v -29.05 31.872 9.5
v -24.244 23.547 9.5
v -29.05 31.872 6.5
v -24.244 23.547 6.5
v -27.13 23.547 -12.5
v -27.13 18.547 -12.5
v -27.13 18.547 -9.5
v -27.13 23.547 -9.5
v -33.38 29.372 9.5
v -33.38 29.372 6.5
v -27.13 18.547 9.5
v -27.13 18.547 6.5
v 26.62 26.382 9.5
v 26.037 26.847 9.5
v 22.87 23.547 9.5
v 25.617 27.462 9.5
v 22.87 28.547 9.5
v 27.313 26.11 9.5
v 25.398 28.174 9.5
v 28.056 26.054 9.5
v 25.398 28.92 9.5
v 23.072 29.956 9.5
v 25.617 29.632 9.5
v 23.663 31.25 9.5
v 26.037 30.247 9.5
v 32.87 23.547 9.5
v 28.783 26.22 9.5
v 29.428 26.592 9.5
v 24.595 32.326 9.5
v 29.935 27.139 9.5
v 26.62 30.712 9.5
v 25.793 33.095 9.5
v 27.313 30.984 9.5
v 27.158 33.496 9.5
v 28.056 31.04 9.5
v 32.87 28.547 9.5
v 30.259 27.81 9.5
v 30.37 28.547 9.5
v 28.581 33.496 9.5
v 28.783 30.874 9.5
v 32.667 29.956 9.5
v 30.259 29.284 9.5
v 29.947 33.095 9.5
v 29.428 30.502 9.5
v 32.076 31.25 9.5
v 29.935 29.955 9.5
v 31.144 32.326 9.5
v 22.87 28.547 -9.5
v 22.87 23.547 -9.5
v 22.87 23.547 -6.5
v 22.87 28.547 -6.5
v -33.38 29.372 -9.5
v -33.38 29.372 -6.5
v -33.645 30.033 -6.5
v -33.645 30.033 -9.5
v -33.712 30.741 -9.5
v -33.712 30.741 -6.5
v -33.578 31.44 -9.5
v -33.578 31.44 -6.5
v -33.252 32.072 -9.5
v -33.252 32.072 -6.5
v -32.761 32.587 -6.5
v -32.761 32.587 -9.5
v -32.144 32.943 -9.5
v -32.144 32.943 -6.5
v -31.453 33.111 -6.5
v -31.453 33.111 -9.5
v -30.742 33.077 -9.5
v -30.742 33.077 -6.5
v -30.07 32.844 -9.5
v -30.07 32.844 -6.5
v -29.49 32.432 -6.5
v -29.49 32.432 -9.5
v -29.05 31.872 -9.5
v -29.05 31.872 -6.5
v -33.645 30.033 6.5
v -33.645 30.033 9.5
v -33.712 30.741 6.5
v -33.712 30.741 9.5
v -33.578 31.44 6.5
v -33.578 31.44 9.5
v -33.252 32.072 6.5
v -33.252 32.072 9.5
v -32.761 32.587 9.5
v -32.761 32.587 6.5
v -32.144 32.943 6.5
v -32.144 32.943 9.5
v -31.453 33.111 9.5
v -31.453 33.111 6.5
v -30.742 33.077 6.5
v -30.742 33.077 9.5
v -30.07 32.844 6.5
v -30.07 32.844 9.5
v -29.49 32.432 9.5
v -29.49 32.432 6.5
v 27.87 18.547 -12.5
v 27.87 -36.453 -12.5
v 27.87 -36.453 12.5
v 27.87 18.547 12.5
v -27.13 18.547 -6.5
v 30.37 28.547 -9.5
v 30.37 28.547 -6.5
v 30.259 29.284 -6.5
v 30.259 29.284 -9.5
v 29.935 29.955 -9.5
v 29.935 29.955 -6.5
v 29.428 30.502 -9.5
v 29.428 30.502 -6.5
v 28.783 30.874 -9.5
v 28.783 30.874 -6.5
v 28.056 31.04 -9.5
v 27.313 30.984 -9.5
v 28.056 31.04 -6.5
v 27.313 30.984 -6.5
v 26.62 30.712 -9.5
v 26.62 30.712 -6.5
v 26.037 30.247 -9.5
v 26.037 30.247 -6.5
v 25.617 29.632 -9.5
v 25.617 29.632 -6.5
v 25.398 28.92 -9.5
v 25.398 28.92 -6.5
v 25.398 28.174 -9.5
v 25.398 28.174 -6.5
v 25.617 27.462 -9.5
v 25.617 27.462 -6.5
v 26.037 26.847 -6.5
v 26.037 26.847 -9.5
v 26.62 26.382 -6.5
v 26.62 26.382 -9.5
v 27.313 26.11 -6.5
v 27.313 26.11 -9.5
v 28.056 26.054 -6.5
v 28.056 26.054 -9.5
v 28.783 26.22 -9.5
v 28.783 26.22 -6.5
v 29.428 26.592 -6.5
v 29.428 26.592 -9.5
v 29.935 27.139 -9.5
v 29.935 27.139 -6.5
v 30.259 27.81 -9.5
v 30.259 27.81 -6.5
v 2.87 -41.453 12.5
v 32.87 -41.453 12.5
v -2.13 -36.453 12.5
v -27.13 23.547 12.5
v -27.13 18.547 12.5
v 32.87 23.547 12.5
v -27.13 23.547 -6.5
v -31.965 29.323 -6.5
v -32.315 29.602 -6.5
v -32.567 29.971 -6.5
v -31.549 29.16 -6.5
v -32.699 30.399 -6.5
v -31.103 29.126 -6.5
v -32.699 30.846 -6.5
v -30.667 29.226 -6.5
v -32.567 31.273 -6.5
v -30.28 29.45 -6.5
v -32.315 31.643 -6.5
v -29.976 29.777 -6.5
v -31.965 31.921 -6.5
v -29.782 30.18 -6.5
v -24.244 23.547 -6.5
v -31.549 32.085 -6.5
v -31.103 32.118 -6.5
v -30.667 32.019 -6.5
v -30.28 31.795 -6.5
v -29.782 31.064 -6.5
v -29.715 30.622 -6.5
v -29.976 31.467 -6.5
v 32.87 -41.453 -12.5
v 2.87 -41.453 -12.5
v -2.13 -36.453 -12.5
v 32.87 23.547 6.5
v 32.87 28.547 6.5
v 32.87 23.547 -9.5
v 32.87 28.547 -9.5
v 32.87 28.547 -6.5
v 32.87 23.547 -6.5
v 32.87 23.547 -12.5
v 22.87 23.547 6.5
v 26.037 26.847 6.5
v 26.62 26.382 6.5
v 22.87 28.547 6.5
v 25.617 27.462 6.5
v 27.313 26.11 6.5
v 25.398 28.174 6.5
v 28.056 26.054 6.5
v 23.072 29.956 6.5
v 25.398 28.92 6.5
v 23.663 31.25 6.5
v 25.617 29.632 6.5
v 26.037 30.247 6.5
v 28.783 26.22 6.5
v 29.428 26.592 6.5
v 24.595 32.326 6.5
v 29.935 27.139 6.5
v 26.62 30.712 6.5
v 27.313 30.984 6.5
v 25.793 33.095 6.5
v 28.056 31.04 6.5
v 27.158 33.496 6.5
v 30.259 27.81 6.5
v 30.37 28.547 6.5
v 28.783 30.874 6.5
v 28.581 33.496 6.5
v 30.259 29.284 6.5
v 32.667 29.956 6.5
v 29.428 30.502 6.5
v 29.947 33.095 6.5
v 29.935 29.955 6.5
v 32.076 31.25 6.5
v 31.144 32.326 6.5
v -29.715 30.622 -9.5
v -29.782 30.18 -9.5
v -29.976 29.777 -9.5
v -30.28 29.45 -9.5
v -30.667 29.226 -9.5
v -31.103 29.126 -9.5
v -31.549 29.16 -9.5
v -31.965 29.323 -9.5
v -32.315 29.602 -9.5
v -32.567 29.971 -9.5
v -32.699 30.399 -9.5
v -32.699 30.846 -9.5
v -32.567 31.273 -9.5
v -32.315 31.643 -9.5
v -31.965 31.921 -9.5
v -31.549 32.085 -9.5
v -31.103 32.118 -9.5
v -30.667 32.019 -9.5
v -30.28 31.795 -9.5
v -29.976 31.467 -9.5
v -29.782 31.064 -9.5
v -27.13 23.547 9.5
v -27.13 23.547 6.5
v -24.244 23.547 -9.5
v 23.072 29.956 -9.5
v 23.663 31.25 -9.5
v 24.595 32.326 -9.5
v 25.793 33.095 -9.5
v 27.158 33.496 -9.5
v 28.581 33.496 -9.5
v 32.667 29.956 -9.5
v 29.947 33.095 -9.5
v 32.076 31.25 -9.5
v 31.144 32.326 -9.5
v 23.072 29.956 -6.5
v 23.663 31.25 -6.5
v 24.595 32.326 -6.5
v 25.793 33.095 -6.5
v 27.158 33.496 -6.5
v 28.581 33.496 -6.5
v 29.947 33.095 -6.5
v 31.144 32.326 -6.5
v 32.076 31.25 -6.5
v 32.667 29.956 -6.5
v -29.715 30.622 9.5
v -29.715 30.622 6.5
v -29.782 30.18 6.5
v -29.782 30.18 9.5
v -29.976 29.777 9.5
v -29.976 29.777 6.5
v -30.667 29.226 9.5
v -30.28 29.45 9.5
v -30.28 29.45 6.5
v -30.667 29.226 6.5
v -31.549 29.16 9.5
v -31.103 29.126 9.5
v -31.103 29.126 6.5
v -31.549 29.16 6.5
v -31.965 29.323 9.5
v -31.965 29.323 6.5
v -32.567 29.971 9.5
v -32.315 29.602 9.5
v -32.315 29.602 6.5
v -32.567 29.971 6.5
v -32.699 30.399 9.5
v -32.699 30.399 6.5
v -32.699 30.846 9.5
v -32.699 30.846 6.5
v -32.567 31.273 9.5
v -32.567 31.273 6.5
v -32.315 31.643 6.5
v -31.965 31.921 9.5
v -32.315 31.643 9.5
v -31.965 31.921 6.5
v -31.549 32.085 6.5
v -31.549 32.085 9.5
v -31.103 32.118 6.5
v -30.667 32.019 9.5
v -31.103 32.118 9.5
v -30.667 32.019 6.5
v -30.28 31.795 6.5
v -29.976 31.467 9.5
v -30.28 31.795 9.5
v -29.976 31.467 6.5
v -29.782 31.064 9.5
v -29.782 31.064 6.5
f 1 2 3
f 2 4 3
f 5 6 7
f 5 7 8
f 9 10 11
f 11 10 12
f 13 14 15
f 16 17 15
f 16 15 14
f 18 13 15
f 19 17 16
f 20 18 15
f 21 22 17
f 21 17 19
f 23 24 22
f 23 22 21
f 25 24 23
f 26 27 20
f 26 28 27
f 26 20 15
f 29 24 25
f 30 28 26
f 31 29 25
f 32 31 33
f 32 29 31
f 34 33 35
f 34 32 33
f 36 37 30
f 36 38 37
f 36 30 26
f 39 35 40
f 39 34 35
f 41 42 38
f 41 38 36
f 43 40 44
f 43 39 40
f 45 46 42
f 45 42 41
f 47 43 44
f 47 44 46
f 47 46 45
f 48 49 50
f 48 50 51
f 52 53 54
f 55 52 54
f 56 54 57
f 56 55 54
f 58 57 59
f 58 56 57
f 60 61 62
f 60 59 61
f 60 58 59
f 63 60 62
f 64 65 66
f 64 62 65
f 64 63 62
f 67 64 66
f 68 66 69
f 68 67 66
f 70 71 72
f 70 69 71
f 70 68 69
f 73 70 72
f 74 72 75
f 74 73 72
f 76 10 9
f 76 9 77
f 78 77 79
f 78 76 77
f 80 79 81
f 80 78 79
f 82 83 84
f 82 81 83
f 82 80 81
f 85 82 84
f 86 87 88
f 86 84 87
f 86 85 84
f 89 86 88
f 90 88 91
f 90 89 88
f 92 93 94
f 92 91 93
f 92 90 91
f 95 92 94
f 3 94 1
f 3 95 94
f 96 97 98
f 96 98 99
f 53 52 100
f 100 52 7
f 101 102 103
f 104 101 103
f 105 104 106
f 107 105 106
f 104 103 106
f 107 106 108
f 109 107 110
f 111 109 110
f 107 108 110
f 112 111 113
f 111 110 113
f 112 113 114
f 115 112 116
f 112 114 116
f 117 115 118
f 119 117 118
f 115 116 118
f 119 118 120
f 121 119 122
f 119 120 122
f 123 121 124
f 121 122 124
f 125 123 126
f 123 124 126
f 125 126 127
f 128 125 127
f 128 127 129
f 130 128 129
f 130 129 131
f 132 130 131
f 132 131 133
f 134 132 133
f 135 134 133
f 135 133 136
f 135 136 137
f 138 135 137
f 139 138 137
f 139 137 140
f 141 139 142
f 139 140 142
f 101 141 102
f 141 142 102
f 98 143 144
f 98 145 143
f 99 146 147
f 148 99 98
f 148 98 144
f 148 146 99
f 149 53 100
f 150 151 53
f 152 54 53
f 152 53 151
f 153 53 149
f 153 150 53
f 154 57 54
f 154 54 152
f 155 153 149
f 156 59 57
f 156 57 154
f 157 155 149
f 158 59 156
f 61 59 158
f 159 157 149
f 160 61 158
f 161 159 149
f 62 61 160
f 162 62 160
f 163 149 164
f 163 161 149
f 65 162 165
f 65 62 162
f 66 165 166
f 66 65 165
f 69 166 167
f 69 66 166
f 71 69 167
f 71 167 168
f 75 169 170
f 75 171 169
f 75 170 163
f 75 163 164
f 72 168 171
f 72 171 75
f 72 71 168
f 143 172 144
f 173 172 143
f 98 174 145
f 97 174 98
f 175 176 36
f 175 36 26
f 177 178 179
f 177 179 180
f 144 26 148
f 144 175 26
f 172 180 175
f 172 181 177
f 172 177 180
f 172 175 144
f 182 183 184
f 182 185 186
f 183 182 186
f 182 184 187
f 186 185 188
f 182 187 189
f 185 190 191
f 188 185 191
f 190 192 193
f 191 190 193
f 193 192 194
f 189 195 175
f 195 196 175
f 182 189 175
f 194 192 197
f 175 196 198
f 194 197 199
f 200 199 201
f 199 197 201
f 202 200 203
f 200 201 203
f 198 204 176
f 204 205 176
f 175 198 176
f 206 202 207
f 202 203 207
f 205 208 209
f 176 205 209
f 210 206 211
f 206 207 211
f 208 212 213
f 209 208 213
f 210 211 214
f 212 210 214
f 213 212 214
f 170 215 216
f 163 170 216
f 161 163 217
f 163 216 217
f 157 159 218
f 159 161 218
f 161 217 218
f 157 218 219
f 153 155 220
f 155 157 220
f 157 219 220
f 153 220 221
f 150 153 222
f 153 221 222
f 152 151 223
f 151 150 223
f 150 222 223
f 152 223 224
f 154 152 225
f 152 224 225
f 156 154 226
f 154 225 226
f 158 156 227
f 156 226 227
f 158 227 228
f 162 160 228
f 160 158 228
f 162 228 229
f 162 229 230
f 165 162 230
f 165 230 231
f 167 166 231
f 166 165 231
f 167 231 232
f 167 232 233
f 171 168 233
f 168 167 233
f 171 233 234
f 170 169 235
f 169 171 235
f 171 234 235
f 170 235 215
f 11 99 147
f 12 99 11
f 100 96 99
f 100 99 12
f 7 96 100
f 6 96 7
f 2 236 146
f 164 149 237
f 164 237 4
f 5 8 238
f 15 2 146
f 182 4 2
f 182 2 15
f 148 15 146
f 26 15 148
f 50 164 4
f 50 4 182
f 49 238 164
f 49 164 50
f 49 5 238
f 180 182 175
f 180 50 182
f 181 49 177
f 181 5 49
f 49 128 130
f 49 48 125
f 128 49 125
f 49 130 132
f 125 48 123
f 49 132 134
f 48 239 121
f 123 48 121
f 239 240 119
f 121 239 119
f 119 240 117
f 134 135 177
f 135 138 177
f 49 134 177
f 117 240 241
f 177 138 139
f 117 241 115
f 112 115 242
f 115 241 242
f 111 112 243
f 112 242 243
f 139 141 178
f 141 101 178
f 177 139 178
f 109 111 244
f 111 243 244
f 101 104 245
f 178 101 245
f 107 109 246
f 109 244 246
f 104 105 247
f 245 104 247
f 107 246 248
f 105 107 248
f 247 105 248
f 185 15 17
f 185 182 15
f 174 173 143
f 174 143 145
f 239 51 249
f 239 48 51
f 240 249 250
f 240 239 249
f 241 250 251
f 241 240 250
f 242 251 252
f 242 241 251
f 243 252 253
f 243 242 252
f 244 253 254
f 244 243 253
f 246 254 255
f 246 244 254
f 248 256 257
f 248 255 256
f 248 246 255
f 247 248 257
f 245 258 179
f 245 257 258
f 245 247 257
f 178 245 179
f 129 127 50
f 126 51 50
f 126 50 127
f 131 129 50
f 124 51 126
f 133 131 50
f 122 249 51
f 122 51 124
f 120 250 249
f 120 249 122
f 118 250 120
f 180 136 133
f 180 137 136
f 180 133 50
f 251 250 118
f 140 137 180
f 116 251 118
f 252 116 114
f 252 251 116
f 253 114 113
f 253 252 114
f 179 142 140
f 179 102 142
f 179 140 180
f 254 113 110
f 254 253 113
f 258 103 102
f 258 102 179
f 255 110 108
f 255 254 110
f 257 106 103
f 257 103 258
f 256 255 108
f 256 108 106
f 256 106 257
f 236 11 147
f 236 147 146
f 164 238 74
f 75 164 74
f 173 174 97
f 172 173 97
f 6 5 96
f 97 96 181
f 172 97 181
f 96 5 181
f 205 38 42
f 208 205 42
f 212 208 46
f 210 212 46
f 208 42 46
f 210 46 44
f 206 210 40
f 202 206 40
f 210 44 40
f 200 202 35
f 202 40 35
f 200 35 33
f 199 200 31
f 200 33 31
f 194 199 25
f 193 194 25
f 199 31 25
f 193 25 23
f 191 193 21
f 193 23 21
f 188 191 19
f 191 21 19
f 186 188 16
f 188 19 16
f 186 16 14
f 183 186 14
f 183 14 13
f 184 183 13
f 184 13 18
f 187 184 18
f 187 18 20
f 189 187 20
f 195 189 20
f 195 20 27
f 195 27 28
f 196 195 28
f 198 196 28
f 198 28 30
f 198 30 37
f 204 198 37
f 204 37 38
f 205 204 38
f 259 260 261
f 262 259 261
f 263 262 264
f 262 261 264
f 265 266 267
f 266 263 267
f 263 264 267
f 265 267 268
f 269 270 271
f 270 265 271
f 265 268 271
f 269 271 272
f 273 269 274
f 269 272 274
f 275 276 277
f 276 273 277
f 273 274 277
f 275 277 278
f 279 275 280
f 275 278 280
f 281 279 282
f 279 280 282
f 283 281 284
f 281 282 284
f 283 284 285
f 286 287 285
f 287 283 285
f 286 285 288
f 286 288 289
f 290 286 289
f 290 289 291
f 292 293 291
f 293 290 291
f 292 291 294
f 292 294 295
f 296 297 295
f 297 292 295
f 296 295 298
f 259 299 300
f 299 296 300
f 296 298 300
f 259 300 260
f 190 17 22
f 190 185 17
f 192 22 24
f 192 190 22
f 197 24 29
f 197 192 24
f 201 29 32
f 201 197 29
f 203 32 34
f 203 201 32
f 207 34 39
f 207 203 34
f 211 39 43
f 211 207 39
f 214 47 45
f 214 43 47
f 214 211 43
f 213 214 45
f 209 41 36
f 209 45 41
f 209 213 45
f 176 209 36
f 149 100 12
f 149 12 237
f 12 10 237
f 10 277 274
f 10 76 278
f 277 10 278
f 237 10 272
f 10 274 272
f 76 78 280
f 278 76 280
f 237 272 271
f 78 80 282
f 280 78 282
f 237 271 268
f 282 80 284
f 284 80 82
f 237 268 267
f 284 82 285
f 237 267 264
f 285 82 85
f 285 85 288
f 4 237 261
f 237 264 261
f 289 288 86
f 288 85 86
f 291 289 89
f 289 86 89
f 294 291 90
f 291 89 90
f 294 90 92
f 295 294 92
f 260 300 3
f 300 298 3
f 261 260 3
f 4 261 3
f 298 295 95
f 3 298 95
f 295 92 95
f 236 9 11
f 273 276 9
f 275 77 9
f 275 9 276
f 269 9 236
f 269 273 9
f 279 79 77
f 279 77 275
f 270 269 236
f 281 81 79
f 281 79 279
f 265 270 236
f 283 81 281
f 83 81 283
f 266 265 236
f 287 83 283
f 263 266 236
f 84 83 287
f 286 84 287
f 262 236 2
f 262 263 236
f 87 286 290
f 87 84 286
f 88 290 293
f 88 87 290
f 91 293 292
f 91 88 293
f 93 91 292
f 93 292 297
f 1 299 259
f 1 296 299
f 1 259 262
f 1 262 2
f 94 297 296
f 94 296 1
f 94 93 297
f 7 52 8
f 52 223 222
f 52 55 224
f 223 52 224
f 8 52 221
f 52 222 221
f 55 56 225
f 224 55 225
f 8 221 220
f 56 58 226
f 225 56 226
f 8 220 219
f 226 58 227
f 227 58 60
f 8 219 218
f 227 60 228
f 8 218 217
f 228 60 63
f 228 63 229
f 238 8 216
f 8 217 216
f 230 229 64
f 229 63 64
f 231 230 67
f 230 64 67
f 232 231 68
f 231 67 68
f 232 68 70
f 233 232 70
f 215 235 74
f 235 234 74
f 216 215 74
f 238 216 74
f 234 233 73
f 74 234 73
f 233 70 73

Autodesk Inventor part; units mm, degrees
ref_plane "YZ Plane" through (0, 0, 0) normal (1, 0, 0) x (0, 1, 0)
ref_plane "XZ Plane" through (0, 0, 0) normal (0, 1, 0) x (-1, 0, 0)
sketch "Sketch1" plane through (0, 0, 0) normal (0, 0, 1) x (1, 0, 0)
  circle A0 centre (-31.2153, 30.6223) radius 1.5
  line L0 (22.8696, 23.547) -> (22.8696, 28.547)
  line L1 (-24.2436, 23.547) -> (22.8696, 23.547)
  line L2 (-24.2436, 23.547) -> (-29.0502, 31.8723)
  arc A1 (-29.0502, 31.8723) -> (-33.3804, 29.3723) centre (-31.2153, 30.6223) ccw
  line L3 (-33.3804, 29.3723) -> (-27.1304, 18.547)
  line L4 (27.8696, 18.547) -> (-27.1304, 18.547)
  line L5 (27.8696, -36.453) -> (27.8696, 18.547)
  line L6 (-2.1304, -36.453) -> (27.8696, -36.453)
  line L7 (2.8696, -41.453) -> (-2.1304, -36.453)
  line L8 (32.8696, -41.453) -> (2.8696, -41.453)
  line L9 (32.8696, 28.547) -> (32.8696, -41.453)
  arc A2 (32.8696, 28.547) -> (22.8696, 28.547) centre (27.8696, 28.547) ccw
  line L10 (27.8696, 18.547) -> (-27.1304, 18.547)
  line L11 (-24.2436, 23.547) -> (-27.1304, 23.547)
  line L12 (-27.1304, 18.547) -> (-27.1304, 23.547)
  line L13 (-27.1304, 23.547) -> (-24.2436, 23.547)
  line L14 (-24.2436, 23.547) -> (32.8696, 23.547)
  line L15 (32.8696, 28.547) -> (32.8696, -41.453)
  point P0 (0, 0)
  point P1 (-2.3882, 28.0958)
  point P2 (32.8696, 23.547)
  point P3 (22.8696, 23.547)
  dimension "d6" = 10
  dimension "d7" = 60
  dimension "d9" = 30
  dimension "d10" = 55
  dimension "d11" = 5
  dimension "d14" = 65
  dimension "d15" = 5
  dimension "d19" = 5
  dimension "d20" = 5
  dimension "d28" = 30
extrude "Extrusion1" add sketch "Sketch1" along normal mid plane 25 contours L14 L9 L8 L7 L6 L5 L4 L12 L11 L1
extrude "Extrusion2" add sketch "Sketch1" along normal mid plane 19 contours L11 L12 L3 A1 L2
extrude "Extrusion3" cut sketch "Sketch1" along normal mid plane 13 contours L0 A2 L9 L14 | L11 L12 L3 A1 L2
ref_plane "Work Plane1" through (-95.3031, 23.4838, 9.5) normal (0, 0, -1) x (-0.001, 1, 0)
extrude "Extrusion5" add sketch "Sketch1" along normal mid plane 19 contours L0 A2 L9 L14
extrude "Extrusion6" cut sketch "Sketch1" along normal mid plane 13 contours L0 A2 L9 L14
sketch "Sketch3" plane through (0, 0, 9.5) normal (0, 0, 1) x (1, 0, 0)
  arc A0 (32.8696, 28.547) -> (22.8696, 28.547) centre (27.8696, 28.547) ccw projected
  circle A1 centre (27.8696, 28.547) radius 2.5
  point P0 (0, 0)
  dimension "d25" = 5
extrude "Extrusion7" cut sketch "Sketch3" against normal through all
properties part number "Claw New side"
